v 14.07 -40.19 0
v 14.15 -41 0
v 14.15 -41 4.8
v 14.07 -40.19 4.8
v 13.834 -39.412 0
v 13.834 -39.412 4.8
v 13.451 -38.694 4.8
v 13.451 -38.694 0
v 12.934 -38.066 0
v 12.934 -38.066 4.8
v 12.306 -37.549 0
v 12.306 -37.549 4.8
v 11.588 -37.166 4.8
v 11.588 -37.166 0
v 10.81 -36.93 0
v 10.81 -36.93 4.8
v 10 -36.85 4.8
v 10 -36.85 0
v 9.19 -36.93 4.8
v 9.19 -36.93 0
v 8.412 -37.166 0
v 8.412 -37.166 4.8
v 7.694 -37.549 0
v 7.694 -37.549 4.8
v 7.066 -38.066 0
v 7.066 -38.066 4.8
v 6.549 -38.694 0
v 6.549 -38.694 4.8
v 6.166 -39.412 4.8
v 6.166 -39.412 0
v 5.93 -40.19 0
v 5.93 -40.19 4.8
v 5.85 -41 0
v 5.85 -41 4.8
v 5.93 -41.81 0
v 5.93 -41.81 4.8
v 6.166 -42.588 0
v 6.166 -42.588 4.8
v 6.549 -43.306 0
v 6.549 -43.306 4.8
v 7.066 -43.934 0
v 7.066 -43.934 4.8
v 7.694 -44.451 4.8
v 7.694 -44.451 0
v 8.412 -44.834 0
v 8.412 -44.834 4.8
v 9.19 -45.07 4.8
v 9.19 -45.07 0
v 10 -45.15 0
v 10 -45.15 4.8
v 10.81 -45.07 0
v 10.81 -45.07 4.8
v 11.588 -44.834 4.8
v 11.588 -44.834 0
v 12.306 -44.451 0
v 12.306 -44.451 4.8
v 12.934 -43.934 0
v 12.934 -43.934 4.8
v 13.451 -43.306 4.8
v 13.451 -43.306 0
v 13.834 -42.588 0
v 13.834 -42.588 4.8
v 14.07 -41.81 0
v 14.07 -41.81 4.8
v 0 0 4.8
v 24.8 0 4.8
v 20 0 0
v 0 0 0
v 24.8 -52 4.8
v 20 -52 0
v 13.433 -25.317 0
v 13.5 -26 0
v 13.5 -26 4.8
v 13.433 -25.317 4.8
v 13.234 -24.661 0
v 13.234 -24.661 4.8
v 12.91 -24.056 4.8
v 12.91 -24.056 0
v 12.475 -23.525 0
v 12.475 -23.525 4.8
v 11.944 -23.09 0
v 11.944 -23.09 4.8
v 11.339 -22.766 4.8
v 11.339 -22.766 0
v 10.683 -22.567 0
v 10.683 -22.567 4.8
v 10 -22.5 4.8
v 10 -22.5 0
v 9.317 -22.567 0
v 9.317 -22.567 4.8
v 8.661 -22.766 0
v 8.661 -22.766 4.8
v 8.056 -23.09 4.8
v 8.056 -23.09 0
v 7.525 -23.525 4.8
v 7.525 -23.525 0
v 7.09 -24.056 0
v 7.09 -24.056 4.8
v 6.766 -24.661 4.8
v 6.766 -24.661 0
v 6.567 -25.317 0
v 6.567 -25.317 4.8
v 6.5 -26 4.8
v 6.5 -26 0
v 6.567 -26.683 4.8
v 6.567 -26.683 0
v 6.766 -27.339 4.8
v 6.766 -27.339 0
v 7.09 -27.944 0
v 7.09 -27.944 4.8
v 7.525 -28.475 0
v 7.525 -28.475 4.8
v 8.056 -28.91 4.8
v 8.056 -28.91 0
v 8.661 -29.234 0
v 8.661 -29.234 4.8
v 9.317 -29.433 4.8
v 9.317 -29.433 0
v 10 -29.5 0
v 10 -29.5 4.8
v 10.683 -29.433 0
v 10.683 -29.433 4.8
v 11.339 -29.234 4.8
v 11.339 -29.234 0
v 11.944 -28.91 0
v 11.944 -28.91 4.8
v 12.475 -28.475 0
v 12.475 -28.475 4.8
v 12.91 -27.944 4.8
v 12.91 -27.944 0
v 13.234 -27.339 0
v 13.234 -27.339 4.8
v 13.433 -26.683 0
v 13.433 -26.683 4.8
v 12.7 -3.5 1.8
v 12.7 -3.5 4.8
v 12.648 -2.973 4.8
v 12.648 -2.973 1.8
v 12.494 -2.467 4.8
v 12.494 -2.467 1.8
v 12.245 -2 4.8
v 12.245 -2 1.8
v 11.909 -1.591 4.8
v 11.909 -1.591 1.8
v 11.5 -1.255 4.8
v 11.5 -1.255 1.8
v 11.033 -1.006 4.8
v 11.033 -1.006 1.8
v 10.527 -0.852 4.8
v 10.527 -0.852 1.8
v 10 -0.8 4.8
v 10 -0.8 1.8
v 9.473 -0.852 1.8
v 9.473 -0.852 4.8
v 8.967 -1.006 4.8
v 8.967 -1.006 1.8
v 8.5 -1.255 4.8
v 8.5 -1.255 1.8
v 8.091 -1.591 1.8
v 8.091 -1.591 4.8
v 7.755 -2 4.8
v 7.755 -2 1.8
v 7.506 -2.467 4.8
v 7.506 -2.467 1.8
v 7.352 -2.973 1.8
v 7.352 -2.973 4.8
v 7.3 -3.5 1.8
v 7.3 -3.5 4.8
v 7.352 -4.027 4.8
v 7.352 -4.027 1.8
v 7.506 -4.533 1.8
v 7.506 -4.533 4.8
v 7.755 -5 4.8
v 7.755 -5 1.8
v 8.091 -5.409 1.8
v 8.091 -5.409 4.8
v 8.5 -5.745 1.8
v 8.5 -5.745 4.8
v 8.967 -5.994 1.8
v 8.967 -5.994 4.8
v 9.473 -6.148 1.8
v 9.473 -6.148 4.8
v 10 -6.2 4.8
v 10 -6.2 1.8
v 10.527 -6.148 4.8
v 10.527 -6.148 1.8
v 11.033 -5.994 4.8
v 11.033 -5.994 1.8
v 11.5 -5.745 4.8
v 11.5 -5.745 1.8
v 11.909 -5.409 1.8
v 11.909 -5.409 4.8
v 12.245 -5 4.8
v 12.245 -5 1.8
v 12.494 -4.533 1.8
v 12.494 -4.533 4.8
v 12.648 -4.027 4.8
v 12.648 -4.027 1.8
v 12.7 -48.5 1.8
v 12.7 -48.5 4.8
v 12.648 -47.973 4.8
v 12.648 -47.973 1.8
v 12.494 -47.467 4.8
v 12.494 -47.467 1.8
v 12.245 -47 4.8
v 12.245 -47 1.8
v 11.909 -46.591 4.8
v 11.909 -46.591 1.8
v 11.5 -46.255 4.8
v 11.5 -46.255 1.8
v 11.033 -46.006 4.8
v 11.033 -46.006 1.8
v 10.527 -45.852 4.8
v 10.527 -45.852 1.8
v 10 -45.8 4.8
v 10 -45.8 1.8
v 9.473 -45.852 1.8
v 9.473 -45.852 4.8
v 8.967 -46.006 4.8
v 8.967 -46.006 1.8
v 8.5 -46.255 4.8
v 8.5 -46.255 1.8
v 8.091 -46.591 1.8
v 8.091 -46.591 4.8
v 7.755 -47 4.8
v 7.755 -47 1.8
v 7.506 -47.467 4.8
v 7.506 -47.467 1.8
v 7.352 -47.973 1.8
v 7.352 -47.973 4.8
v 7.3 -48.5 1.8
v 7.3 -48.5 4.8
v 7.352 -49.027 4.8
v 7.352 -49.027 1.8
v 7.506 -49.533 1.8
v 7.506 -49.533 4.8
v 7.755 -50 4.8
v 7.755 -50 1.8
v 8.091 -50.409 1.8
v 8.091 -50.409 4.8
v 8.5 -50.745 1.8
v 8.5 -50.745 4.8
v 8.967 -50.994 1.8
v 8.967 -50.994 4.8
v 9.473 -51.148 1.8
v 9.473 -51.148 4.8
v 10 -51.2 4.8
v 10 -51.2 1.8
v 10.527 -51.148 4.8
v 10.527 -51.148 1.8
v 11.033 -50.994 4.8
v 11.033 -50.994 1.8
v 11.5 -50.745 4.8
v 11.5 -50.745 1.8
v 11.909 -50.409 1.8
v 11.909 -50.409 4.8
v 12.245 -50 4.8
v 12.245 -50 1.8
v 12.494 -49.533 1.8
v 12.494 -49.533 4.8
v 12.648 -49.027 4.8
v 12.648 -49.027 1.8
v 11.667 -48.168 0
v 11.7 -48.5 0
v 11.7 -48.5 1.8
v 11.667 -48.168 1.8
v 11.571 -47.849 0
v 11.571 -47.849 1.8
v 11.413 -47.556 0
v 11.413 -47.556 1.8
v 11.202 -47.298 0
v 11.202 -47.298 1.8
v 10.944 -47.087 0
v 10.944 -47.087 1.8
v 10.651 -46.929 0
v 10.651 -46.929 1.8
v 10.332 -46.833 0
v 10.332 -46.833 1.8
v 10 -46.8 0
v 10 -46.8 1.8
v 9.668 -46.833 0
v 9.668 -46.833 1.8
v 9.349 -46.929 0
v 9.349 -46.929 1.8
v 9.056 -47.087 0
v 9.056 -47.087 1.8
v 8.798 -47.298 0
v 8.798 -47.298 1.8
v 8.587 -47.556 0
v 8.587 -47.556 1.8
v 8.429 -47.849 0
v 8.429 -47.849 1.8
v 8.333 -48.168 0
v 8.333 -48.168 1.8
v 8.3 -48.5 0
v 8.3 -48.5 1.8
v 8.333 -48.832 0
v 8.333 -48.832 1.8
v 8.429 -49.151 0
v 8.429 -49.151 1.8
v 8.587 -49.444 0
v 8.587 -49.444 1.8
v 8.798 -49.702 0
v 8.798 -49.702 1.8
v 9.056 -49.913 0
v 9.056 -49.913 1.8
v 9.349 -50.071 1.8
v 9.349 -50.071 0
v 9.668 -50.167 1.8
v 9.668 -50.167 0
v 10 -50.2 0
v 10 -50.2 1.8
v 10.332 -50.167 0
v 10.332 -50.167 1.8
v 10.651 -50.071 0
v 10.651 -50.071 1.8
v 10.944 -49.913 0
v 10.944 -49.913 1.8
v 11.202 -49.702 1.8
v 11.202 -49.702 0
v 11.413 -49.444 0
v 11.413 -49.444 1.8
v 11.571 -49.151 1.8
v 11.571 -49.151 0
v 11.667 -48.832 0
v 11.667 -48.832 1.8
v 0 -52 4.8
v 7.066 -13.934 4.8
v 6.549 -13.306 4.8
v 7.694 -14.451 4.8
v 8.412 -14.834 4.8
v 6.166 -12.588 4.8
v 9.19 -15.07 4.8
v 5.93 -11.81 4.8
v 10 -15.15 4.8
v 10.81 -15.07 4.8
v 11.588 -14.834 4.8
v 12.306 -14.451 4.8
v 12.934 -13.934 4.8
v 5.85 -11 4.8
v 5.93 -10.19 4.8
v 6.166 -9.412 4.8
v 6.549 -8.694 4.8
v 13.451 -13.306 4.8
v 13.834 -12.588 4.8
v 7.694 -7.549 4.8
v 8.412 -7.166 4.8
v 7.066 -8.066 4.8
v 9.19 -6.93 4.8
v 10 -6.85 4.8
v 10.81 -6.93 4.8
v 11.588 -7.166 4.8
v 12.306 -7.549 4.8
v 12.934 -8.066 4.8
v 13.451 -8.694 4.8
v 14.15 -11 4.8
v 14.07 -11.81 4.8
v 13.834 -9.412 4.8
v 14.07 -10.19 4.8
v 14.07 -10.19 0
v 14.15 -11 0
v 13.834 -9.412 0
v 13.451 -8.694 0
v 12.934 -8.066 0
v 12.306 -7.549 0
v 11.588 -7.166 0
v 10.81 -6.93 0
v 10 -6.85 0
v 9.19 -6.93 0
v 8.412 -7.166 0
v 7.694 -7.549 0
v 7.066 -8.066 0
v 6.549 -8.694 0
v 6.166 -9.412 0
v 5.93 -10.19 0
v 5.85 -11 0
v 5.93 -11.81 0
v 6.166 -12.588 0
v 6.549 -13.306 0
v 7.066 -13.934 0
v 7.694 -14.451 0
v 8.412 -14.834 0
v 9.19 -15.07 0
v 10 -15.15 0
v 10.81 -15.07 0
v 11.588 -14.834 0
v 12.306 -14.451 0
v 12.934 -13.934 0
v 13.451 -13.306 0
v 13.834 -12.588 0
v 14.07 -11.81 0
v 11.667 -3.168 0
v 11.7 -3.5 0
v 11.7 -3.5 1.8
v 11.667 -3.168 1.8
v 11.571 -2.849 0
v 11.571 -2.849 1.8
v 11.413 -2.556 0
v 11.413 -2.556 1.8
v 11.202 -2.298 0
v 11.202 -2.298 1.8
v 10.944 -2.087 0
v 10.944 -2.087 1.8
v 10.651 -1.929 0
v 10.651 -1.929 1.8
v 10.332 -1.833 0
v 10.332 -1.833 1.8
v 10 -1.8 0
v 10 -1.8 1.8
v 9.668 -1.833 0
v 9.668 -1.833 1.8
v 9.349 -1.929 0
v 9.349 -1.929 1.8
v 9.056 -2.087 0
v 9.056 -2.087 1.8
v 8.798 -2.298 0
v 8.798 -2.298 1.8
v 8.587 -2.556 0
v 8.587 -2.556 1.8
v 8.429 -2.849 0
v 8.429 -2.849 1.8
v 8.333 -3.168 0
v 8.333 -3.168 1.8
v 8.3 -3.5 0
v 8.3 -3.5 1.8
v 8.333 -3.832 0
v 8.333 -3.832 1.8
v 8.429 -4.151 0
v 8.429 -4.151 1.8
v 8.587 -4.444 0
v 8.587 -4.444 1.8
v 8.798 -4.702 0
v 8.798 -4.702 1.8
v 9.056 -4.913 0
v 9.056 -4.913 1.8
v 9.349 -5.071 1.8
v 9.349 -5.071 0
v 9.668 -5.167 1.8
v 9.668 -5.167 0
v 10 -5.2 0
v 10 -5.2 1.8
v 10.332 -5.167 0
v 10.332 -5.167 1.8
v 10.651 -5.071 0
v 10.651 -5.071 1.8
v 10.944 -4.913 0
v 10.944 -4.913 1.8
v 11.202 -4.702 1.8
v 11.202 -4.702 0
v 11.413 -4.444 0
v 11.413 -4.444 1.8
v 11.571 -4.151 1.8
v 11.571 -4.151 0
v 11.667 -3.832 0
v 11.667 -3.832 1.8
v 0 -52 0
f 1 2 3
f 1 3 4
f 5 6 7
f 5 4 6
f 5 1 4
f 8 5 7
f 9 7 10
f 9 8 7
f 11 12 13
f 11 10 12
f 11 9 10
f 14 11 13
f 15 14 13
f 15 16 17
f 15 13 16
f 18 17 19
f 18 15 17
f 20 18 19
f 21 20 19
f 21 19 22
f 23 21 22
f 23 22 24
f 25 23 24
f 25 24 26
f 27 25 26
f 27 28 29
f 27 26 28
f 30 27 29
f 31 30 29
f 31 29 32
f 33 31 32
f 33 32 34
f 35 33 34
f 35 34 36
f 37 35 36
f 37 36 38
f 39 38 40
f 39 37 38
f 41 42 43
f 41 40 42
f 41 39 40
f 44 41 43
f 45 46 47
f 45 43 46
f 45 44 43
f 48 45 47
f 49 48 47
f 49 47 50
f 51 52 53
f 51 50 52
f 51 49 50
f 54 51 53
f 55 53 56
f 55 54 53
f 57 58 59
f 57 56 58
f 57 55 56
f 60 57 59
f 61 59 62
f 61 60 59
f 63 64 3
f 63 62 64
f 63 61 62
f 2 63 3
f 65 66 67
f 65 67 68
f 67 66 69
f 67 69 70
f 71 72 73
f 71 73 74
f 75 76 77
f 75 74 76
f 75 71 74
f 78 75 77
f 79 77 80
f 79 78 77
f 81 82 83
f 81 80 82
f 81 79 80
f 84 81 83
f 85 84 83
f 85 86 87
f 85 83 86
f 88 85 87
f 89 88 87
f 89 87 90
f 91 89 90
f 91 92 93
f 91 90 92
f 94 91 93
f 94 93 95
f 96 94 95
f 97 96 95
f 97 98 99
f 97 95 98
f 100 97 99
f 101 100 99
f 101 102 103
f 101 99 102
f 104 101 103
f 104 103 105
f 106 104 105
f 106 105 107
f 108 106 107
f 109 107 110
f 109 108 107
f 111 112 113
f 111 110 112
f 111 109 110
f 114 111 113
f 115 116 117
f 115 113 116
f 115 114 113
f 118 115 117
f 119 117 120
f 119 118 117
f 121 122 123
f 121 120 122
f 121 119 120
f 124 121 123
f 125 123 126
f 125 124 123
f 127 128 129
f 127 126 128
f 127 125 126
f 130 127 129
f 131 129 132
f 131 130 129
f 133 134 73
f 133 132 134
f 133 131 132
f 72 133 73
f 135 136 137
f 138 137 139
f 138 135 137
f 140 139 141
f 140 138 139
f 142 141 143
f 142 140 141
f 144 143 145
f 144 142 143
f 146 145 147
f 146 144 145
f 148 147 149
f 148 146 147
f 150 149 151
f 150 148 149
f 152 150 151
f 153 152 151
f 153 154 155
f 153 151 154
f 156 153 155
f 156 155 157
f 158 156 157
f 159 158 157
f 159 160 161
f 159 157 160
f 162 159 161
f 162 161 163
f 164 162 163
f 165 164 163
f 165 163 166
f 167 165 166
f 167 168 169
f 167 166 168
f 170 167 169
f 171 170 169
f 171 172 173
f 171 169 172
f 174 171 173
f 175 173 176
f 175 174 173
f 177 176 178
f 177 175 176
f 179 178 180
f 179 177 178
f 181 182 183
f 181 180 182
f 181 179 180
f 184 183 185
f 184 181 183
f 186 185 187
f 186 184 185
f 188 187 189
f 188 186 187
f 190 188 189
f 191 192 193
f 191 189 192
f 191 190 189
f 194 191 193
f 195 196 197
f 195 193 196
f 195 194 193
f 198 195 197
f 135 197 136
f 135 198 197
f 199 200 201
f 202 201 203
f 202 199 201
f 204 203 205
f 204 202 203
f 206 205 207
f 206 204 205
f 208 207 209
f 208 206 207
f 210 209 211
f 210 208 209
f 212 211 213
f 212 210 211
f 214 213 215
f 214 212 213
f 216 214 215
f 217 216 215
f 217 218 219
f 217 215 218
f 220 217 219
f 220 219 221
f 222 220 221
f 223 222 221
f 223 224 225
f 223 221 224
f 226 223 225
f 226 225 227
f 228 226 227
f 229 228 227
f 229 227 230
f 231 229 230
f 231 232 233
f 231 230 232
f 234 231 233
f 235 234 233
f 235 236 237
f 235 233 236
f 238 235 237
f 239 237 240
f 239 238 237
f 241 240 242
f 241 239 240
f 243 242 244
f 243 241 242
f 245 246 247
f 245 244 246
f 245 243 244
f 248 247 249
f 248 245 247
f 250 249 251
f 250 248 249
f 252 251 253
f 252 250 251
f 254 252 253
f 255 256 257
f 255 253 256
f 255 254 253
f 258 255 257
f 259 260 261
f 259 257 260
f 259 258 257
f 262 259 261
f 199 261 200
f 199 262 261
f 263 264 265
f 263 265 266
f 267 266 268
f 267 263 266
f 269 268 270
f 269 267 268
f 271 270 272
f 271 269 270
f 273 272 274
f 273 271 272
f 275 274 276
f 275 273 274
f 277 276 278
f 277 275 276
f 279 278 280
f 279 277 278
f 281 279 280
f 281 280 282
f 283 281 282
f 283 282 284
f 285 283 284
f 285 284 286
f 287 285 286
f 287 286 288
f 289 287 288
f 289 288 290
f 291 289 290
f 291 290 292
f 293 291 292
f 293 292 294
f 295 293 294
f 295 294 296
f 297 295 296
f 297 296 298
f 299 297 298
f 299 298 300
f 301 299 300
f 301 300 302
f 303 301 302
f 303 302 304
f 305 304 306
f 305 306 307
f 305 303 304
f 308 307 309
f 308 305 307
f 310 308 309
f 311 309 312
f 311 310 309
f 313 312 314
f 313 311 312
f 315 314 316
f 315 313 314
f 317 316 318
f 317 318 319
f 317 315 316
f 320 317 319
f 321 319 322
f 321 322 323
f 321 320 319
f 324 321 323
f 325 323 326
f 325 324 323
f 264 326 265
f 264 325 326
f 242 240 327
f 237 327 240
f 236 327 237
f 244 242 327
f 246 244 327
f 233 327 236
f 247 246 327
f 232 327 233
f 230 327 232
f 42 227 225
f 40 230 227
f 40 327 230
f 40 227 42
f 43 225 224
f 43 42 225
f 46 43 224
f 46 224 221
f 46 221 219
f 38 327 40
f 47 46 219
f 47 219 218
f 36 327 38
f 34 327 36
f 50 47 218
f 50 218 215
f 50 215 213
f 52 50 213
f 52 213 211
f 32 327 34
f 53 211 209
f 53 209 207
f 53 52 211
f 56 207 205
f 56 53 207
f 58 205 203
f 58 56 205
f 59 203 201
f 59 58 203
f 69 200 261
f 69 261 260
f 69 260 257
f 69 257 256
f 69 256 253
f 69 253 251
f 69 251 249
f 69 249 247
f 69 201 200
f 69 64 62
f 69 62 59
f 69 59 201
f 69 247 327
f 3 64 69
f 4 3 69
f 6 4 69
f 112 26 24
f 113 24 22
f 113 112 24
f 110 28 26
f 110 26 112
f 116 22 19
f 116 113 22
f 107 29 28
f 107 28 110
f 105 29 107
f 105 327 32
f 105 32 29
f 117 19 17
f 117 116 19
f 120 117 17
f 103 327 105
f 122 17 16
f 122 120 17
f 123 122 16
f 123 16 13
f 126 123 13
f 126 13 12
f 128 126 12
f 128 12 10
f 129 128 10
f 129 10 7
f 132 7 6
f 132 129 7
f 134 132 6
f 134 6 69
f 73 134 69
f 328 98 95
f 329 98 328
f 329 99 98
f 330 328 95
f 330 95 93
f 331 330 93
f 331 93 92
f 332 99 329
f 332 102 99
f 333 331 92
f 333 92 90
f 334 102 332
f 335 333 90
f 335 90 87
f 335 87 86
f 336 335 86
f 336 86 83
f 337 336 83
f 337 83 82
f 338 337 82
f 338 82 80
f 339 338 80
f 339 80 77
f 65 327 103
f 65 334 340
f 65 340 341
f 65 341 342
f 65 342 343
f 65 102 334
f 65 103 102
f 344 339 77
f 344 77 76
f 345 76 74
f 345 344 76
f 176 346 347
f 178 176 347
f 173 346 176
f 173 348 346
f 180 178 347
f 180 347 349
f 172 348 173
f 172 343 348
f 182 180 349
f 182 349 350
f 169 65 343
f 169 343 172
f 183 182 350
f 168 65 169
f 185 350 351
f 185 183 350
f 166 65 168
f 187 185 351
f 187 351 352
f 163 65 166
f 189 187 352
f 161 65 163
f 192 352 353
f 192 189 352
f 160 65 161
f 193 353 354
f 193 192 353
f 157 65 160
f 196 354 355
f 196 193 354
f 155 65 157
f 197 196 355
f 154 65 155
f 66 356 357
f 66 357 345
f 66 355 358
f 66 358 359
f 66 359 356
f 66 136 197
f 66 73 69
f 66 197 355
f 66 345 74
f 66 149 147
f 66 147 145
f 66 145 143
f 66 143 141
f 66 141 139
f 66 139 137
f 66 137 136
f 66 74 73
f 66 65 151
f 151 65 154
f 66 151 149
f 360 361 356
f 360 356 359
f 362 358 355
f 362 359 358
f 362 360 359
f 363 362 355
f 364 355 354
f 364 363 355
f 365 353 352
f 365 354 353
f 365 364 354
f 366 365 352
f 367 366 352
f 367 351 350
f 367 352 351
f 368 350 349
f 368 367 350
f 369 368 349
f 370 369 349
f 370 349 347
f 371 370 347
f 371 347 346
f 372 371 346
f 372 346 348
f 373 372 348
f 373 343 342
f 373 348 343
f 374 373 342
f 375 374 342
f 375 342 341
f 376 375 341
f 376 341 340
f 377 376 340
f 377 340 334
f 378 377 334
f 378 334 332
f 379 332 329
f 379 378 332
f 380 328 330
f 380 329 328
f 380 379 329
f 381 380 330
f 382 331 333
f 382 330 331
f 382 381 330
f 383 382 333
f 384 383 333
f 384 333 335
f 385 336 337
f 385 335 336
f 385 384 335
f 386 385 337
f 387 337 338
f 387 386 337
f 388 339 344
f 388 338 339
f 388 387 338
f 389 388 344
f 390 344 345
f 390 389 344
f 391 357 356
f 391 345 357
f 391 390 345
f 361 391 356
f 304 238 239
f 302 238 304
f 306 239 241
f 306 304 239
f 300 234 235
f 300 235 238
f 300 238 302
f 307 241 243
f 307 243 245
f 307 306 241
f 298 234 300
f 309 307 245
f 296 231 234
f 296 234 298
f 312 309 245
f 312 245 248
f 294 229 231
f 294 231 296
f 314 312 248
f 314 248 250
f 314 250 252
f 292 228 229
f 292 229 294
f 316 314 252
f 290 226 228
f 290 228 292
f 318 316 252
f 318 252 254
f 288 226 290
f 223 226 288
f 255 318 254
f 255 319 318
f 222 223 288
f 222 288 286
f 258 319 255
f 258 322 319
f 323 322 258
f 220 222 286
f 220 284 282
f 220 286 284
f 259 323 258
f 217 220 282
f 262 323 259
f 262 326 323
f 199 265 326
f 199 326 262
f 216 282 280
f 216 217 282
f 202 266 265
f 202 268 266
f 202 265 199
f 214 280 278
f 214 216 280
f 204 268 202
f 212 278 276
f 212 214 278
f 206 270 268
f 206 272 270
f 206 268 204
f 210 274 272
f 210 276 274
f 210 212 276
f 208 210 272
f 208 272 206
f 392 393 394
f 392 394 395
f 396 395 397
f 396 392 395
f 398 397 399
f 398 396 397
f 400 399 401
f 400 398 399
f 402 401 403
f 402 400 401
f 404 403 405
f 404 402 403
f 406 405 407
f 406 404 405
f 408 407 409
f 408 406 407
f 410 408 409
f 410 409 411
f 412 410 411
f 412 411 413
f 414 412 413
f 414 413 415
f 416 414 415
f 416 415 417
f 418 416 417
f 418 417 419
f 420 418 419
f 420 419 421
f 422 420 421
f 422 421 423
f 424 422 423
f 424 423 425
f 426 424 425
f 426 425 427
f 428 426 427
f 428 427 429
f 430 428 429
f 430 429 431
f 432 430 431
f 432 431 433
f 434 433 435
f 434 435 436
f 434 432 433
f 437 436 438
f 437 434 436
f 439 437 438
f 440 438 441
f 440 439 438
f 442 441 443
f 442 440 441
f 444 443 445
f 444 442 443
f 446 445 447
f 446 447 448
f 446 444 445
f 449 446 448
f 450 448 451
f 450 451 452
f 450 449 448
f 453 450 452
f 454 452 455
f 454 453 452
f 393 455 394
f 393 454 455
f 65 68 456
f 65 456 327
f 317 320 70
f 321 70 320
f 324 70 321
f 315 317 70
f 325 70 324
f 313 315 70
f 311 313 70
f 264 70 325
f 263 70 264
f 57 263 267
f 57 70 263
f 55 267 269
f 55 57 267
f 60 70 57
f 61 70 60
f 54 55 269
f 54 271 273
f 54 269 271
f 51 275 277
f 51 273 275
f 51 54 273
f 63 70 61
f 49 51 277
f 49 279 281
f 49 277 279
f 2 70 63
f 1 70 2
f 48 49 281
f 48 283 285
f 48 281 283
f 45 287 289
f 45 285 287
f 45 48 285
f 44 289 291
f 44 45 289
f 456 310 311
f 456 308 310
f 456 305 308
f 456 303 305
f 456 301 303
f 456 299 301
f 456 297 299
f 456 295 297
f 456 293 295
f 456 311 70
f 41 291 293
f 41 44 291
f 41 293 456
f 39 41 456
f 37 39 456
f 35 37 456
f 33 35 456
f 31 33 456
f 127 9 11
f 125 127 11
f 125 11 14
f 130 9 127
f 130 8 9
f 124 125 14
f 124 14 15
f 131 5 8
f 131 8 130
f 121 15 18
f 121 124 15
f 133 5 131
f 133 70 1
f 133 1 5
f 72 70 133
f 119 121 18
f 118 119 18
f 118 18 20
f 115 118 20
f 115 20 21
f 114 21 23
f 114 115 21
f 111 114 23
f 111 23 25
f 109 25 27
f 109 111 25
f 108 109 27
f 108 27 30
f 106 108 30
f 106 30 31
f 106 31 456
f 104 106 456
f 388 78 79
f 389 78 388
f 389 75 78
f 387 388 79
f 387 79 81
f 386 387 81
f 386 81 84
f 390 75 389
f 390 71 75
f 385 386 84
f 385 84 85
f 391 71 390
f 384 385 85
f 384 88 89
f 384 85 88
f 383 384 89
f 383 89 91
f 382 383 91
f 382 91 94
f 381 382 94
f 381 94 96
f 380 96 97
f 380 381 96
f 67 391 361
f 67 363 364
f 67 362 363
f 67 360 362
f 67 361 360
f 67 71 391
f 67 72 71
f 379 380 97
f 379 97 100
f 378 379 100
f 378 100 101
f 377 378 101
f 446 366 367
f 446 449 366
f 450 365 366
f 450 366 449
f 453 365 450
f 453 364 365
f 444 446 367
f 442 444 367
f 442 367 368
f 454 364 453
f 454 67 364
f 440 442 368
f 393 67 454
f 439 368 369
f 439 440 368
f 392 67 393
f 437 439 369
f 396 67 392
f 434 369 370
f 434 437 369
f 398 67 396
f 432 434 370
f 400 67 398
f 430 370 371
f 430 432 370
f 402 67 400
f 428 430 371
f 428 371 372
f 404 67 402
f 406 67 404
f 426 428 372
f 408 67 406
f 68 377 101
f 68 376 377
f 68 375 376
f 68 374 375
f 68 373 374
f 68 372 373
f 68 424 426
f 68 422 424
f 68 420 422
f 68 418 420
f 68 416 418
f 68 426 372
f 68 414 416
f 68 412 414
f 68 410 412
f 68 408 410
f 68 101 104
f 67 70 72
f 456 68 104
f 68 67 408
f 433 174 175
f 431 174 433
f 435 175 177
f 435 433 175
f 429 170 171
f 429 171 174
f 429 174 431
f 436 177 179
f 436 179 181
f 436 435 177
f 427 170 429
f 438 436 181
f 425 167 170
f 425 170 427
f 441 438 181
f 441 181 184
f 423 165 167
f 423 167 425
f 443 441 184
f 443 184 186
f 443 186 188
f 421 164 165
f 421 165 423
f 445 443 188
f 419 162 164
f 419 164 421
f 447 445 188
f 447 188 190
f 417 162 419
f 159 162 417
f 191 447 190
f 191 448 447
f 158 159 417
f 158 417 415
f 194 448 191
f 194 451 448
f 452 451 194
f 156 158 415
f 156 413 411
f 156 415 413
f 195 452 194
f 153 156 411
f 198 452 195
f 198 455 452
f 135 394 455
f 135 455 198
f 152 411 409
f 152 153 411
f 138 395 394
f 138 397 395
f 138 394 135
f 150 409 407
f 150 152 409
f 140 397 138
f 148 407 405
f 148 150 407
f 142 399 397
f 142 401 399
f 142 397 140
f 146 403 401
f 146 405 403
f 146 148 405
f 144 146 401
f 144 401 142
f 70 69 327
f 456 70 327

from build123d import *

# Parameters (mm, degrees)
CYLINDER1006_R     = 4.15
CYLINDER1006_DEPTH = 70
CYLINDER1020_R     = 2.7
CYLINDER1020_DEPTH = 10
CYLINDER1018_R     = 1.7
CYLINDER1018_DEPTH = 10
CYLINDER1032_R     = 3.5
CYLINDER1032_DEPTH = 10
PAD021_DEPTH       = 52


with BuildPart() as f_8mmrodmaster:
    # Cylinder1006 → Cylinder1006 (new body)
    with BuildSketch(Plane.XY):
        Circle(CYLINDER1006_R)
    extrude(amount=CYLINDER1006_DEPTH)


with BuildPart() as clone_of_8mmrodmaster005:
    # Clone046 base: copy of 8mmRodMaster
    add(f_8mmrodmaster.part)


with BuildPart() as clone_of_8mmrodmaster005_1:
    # Clone046 placement: moved
    add(clone_of_8mmrodmaster005.part.moved(Location((10, -11, -55.2))))


with BuildPart() as cylinder1015:
    # Cylinder1020 → Cylinder1020 (new body)
    with BuildSketch(Plane.XY.offset(10)):
        Circle(CYLINDER1020_R)
    extrude(amount=CYLINDER1020_DEPTH)


with BuildPart() as m3bolthead:
    # Cylinder1018 → Cylinder1018 (new body)
    with BuildSketch(Plane.XY):
        Circle(CYLINDER1018_R)
    extrude(amount=CYLINDER1018_DEPTH)

    # Fusion024: union Cylinder1015
    add(cylinder1015.part)


with BuildPart() as clone_of_m3bolthead005:
    # Clone047 base: copy of M3BoltHead
    add(m3bolthead.part)


with BuildPart() as clone_of_m3bolthead005_1:
    # Clone047 placement: moved
    add(clone_of_m3bolthead005.part.moved(Location((10, -3.5, -8.2))))


with BuildPart() as clone_of_m3bolthead006:
    # Clone048 base: copy of M3BoltHead
    add(m3bolthead.part)


with BuildPart() as clone_of_m3bolthead006_1:
    # Clone048 placement: moved
    add(clone_of_m3bolthead006.part.moved(Location((10, -48.5, -8.2))))


with BuildPart() as cylinder1046:
    # Cylinder1032 → Cylinder1032 (new body)
    with BuildSketch(Plane(origin=(10, -26, -4.4), x_dir=(1, 0, 0), z_dir=(0, 0, 1))):
        Circle(CYLINDER1032_R)
    extrude(amount=CYLINDER1032_DEPTH)


with BuildPart() as fusion049:
    # Clone045 base: copy of 8mmRodMaster
    add(f_8mmrodmaster.part)


with BuildPart() as fusion049_1:
    # Clone045 placement: moved
    add(fusion049.part.moved(Location((10, -41, -55.2))))

    # Fusion049: union Clone of 8mmRodMaster005, Clone of M3BoltHead005, Clone of M3BoltHead006, Cylinder1046
    add(clone_of_8mmrodmaster005_1.part)
    add(clone_of_m3bolthead005_1.part)
    add(clone_of_m3bolthead006_1.part)
    add(cylinder1046.part)


with BuildPart() as clone_of_bearingfix:
    # Sketch022 → Pad021 (new body)
    with BuildSketch(Plane.XZ):
        Polygon((0, 0), (0, 4.8), (24.8, 4.8), (20, 0), align=None)
    extrude(amount=PAD021_DEPTH)

    # Cut051: cut Fusion049
    add(fusion049_1.part, mode=Mode.SUBTRACT)


solid = clone_of_bearingfix.part
